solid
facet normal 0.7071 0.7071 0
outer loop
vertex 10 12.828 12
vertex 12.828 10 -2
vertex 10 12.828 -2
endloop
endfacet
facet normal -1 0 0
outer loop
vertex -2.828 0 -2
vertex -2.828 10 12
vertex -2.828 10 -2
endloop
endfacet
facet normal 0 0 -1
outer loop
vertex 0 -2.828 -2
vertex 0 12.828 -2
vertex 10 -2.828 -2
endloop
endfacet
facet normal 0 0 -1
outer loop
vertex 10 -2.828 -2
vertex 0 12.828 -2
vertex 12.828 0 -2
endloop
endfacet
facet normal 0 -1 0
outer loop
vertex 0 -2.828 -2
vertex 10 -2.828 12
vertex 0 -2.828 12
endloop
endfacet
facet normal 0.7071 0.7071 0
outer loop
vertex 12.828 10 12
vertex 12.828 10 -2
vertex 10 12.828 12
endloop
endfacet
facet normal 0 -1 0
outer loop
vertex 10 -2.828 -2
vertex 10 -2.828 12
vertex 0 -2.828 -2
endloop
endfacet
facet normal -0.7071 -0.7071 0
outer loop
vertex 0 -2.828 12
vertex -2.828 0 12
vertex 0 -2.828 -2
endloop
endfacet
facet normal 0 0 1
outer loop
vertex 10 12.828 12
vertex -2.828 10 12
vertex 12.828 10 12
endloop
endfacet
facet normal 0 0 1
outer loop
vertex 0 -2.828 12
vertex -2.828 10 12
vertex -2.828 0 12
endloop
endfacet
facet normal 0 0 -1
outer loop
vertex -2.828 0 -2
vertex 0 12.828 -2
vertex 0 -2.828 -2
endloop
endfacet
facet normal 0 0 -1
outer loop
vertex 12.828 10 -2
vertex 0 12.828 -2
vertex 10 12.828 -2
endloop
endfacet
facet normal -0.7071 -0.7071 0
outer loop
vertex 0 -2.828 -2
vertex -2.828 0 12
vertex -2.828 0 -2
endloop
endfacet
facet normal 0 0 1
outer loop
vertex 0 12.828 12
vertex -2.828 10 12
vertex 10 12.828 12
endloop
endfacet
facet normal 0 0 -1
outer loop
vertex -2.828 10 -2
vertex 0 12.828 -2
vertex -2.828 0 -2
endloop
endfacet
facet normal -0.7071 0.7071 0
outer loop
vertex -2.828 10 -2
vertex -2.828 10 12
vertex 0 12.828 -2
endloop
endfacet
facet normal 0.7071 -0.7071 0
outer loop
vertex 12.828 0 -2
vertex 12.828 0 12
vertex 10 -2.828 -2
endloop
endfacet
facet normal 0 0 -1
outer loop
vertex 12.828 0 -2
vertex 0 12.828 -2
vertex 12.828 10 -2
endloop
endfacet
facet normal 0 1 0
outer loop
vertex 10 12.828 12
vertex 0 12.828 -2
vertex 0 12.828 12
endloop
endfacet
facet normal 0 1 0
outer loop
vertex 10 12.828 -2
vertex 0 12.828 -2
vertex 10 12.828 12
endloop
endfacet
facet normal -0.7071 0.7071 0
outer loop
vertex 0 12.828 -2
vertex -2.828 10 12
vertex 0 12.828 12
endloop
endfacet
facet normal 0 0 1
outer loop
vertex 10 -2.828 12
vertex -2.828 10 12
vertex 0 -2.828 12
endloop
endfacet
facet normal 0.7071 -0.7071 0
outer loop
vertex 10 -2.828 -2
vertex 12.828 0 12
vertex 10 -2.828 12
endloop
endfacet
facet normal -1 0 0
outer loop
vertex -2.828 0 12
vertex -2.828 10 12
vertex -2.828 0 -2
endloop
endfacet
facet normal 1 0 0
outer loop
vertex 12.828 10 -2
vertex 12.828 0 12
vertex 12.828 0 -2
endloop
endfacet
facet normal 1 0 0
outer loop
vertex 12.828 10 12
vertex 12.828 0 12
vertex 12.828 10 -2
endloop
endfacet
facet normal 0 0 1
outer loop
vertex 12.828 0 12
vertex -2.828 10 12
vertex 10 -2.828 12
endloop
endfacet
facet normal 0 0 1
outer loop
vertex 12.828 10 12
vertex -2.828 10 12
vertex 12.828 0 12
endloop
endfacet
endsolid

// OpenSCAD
minkowski() { cube(10); rotate([0, 0, 45]) cube(4, center = true); }
